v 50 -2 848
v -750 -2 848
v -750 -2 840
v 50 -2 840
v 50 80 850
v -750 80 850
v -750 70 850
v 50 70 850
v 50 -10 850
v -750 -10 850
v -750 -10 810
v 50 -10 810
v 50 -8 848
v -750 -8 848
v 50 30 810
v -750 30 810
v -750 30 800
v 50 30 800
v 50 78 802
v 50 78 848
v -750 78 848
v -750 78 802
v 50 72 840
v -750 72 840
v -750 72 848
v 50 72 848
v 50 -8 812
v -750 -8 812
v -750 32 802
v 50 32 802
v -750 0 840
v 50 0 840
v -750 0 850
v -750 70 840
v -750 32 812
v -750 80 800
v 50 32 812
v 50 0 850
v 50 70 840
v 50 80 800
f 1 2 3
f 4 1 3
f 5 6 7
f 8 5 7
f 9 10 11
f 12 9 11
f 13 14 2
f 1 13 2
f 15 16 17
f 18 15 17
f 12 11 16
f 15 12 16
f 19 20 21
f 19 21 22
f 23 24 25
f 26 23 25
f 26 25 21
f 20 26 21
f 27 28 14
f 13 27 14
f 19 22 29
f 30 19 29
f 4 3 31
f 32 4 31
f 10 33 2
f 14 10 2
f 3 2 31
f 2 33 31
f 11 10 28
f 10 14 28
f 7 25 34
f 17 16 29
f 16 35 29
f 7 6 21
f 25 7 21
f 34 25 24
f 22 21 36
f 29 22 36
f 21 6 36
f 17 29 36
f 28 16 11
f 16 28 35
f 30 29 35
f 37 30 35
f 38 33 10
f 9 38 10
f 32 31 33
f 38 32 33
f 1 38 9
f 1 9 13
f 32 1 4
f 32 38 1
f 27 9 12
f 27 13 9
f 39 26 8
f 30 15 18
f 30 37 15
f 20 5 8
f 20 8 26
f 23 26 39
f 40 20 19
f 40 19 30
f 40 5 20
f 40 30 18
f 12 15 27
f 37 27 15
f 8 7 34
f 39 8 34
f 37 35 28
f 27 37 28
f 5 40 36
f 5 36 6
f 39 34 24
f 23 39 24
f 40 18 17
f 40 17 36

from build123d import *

# Parameters (mm, degrees)
F1_DEPTH = 800
F2_ANGLE = 180
F3_ANGLE = 270


# Not quite as in the source:
# - a feature of the source that left no trace in its solid (it failed there, or was rolled back) is left out


with BuildPart() as f1:
    # F0 (on Top) → F1 (new body)
    with BuildSketch(Plane.XY):
        Polygon((10, 0), (0, 0), (0, -10), (40, -10), (40, 30), (50, 30), (50, 80), (0, 80), (0, 70), (10, 70), (10, 72), (2.000000095, 72), (2.000000095, 78), (48, 78), (48, 32), (38, 32), (38, -8), (2, -8), (2, -2), (10, -2), align=None)
    extrude(amount=F1_DEPTH)


with BuildPart() as f1_1:
    # F2: moved
    add(f1.part.rotate(Axis((50, 55, 800), (0, 1, 0)), F2_ANGLE))


with BuildPart() as f1_2:
    # F3: moved
    add(f1_1.part.rotate(Axis((50, 55, 800), (0, 1, 0)), F3_ANGLE))


solid = f1_2.part
